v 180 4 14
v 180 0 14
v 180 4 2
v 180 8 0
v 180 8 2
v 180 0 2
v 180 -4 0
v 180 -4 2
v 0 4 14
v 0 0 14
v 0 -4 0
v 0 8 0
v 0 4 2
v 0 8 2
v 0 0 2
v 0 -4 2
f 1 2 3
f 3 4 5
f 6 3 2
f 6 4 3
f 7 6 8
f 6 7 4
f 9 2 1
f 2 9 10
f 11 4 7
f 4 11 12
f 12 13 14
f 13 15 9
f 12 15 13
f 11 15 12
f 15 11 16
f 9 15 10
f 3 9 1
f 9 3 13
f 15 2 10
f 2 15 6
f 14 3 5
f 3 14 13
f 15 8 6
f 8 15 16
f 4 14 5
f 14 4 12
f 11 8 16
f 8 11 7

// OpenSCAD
cube( [ 180, 4, 14 ] );
translate( [ 0, -4, 0 ] )
    cube( [ 180, 12, 2 ] );
